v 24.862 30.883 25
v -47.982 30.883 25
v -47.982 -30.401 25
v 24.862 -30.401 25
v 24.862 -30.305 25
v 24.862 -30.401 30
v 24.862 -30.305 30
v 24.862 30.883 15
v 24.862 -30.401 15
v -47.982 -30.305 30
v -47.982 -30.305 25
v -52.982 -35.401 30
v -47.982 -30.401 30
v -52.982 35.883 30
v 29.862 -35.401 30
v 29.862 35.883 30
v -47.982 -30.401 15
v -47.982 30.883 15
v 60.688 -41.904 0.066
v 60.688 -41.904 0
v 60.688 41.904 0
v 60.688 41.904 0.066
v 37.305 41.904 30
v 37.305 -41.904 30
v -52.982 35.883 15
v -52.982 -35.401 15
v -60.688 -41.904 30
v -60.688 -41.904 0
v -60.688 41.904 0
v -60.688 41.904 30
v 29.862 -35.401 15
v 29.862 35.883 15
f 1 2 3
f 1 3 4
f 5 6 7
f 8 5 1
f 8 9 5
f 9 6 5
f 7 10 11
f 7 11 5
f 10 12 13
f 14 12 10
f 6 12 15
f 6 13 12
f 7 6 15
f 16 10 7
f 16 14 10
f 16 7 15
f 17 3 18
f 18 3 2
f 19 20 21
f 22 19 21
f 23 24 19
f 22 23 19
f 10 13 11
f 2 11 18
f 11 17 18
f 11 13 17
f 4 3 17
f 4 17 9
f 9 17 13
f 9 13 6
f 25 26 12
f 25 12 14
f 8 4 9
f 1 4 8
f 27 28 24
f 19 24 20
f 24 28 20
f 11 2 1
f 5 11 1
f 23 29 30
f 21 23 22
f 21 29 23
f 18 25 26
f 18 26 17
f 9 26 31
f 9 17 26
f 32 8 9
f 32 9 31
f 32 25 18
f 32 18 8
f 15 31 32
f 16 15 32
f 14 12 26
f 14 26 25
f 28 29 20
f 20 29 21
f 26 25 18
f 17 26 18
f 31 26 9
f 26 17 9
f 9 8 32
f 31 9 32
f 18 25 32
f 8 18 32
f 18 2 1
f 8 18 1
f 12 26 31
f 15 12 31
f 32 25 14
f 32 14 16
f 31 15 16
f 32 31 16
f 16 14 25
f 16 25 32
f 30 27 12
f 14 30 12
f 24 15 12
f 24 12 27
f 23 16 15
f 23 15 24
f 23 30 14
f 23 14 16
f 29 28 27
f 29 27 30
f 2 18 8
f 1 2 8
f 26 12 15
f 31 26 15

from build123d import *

# Parameters (mm, degrees)
F0_W      = 121.3761568069
F0_H      = 83.8073417544
F1_DEPTH  = 30
F3_DEPTH  = 250
F4_W      = 82.8440375626
F4_H      = 71.2844058871
F5_DEPTH  = 5
F6_W      = 82.8440375626
F6_H      = 71.2844058871
F6_W_2    = 72.8440375626
F6_H_2    = 61.2844058871
F7_DEPTH  = 10
F8_W      = 82.8440375626
F8_H      = 71.2844058871
F8_W_2    = 72.8440375626
F8_H_2    = 61.2844058871
F9_DEPTH  = 15
F10_W     = 75.9493652731
F10_H     = 63.1234776229
F11_DEPTH = 5


with BuildPart() as f1:
    # F0 (on Top) → F1 (new body)
    with BuildSketch(Plane.XY):
        Rectangle(F0_W, F0_H)
    extrude(amount=F1_DEPTH)

    # F2 (on Front) → F3 (cut, symmetric)
    with BuildSketch(Plane.XZ):
        Polygon((60.6880784035, 0), (60.7399642467, 0), (60.6880784035, 0.0664218806), align=None)
        Polygon((37.305287547, 30), (60.6880784035, 0.0664218806), (60.6880784035, 30), align=None)
    extrude(amount=F3_DEPTH, both=True, mode=Mode.SUBTRACT)

    # F4 (on face) → F5 (cut)
    with BuildSketch(Plane.XY.offset(30)):
        with Locations((-11.5596335381, 0.2408251166)):
            Rectangle(F4_W, F4_H)
    extrude(amount=-F5_DEPTH, mode=Mode.SUBTRACT)

    # F6 (on face) → F7 (cut)
    with BuildSketch(Plane.XY.offset(25)):
        with Locations((-11.5596335381, 0.2408251166)):
            Rectangle(F6_W, F6_H)
        with Locations((-11.5596335381, 0.2408251166)):
            Rectangle(F6_W_2, F6_H_2, mode=Mode.SUBTRACT)
    extrude(amount=-F7_DEPTH, mode=Mode.SUBTRACT)


with BuildPart() as f9:
    # F8 (on face) → F9 (new body, through all)
    with BuildSketch(Plane.XY.offset(15)):
        with Locations((-11.5596335381, 0.2408251166)):
            Rectangle(F8_W, F8_H)
        with Locations((-11.5596335381, 0.2408251166)):
            Rectangle(F8_W_2, F8_H_2, mode=Mode.SUBTRACT)
    extrude(amount=F9_DEPTH)

    # F10 (on face) → F11 (join, through all)
    with BuildSketch(Plane.XY.offset(30)):
        with Locations((-11.1807389185, 1.2565301731)):
            Rectangle(F10_W, F10_H)
    extrude(amount=-F11_DEPTH)


solid = Compound([f1.part, f9.part])
